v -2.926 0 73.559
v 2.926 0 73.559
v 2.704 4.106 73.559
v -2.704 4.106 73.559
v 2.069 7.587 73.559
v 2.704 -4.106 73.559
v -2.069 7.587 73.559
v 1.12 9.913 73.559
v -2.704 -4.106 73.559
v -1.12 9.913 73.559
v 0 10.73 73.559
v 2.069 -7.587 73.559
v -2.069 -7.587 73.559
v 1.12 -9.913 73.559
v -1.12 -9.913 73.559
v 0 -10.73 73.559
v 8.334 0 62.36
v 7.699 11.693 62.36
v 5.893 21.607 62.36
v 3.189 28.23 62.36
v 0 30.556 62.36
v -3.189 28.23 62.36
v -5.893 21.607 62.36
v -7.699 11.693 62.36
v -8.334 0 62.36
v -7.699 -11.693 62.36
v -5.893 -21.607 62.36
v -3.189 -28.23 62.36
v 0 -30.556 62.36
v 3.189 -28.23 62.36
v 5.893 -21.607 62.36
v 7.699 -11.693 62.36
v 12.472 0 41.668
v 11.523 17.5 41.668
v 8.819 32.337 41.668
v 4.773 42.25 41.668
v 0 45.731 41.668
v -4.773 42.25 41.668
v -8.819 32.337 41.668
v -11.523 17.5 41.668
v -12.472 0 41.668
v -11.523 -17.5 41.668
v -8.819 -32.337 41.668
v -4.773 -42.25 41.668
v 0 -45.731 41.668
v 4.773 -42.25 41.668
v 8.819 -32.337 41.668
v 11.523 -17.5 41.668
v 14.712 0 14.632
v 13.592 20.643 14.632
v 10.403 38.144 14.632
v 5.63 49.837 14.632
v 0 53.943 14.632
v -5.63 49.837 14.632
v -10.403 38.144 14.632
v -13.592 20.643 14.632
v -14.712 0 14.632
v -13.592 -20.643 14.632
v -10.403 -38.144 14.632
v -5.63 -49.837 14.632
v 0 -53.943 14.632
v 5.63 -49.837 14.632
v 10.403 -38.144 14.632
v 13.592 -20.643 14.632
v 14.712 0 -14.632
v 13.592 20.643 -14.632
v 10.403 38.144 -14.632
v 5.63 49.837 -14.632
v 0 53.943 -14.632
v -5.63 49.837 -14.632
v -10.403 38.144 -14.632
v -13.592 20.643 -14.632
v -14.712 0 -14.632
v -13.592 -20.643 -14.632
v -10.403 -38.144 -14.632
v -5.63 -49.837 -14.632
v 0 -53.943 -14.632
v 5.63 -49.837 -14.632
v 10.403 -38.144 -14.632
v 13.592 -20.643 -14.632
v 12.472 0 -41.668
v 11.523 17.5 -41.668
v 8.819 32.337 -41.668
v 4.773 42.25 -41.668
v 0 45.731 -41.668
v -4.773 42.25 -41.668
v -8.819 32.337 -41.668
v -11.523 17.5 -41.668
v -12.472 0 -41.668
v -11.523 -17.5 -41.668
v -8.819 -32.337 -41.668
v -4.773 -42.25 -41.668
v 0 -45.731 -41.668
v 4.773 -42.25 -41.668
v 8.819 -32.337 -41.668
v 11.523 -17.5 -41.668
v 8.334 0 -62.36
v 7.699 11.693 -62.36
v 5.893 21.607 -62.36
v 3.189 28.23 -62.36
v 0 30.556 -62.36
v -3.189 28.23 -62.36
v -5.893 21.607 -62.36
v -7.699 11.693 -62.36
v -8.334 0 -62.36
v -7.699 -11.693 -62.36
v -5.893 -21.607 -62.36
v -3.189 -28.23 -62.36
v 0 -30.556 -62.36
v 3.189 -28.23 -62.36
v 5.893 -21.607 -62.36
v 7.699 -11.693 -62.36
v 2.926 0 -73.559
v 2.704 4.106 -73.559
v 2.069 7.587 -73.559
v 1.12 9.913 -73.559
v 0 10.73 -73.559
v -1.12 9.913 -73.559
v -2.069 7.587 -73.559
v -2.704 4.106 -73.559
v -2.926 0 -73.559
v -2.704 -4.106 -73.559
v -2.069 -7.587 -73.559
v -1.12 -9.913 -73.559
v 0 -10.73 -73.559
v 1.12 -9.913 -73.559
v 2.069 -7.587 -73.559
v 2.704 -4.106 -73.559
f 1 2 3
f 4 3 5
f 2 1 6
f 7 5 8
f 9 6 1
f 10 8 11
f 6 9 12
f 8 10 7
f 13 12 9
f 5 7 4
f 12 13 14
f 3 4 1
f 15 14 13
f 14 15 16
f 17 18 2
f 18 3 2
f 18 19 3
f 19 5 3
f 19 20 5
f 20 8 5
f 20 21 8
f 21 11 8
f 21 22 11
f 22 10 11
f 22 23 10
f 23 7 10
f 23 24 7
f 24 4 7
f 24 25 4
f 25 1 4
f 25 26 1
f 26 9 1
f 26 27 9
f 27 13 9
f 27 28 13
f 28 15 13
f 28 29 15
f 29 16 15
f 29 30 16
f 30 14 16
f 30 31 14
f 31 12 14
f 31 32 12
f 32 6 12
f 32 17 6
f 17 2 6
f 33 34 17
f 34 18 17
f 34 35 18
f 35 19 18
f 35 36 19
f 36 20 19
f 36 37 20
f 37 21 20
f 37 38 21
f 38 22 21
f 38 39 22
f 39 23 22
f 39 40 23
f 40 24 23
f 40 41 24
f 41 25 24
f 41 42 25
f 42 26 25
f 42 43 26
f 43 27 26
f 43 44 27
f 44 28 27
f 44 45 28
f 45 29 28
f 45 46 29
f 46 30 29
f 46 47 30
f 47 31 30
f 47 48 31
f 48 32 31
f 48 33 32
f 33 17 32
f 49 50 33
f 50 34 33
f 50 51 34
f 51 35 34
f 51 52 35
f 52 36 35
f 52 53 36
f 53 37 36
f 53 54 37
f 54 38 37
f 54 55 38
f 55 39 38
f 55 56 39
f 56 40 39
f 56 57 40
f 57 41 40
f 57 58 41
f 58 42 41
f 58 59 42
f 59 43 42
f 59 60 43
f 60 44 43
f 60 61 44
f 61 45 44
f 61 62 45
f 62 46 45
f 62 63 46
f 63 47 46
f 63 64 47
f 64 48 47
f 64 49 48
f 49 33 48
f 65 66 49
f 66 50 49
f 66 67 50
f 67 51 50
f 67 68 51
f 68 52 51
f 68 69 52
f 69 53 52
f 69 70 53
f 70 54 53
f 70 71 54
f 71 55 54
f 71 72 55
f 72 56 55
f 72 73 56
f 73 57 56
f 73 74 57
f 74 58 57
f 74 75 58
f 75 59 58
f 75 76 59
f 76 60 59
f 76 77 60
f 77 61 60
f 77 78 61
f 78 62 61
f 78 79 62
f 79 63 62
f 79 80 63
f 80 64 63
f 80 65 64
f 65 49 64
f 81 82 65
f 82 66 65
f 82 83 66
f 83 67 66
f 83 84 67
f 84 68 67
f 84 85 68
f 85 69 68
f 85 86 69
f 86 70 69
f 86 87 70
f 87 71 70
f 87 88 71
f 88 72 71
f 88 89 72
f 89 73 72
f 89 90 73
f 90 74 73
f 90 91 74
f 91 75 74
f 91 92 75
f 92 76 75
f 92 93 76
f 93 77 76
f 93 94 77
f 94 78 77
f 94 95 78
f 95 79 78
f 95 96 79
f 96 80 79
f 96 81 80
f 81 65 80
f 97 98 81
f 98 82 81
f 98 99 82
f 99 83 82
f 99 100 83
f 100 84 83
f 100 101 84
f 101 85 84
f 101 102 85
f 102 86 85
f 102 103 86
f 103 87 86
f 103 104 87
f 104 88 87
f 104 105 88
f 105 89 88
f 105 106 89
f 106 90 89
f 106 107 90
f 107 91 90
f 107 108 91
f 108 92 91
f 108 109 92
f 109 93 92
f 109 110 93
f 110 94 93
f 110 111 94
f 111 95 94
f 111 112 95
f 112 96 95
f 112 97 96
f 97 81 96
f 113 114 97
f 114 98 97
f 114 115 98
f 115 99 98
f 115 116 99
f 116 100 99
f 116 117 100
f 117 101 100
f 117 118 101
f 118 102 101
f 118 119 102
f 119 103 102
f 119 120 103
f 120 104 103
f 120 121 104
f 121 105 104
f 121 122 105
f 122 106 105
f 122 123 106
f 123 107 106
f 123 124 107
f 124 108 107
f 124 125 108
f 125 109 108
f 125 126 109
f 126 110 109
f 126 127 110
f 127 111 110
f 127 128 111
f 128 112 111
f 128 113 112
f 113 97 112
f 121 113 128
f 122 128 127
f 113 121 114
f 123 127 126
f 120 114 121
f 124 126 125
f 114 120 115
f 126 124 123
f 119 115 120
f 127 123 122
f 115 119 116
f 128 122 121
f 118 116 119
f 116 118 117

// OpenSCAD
// Generated by SolidPython 1.0.1 on 2020-07-29 00:46:45


scale(v = [3, 11, 15]) {
	sphere(r = 5);
}
/***********************************************
*********      SolidPython code:      **********
************************************************
 
# import packages: SolidPython
from solid import *
from solid.utils import *
from itertools import chain, combinations, permutations


class Resize:

    def __init__(self, scad_file):
        self.scad_file = scad_file
        #self.scad_file = import_scad(scad_file)
        # cone/cylinder param:
        self.r1 = 0
        self.r2 = 0
        self.h = 0
        # rectangular prism param:
        self.w = 0
        self.l = 0
        # ellipse param:
        self.r = 0

    # import OpenScad code (file name corresponds to shape)


    # classify shape + parameters
    def assign(self, param1, param2, param3):
        if self.scad_file == 'cone.scad':
            self.r1 = param1
            self.r2 = param2
            self.h = param3
        elif self.scad_file == 'cylinder.scad':
            self.r1 = param1
            self.r2 = param2
            self.h = param3
        elif self.scad_file == 'rectangularPrism.scad':
            self.h = param1
            self.l = param2
            self.w = param3
        else:
            self.r = param1
            self.h = param2

    # resize parameters
    def iterate(self):
        x = range(3, 20, 2)
        i = 1
        if self.scad_file == 'cone.scad':
            tempList = list(permutations(x, 2))
            for temp in tempList:
                param1 = temp[0]
                param2 = temp[1]
                filepath = 'produced_scad_files/' + 'cone' + str(param1) + '_' + str(param2) + '_' + '.scad'
                scad_render_to_file(cylinder(h=param1, r1=param2, r2=0), filepath)

        elif self.scad_file == 'cylinder.scad':
            tempList = list(permutations(x, 3))
            for temp in tempList:
                param1 = temp[0]
                param2 = temp[1]
                filepath = 'produced_scad_files/' + 'cylinder' + str(param1) + '_' + str(param2) + '_' + '.scad'
                scad_render_to_file(cylinder(h=param1, r1=param2, r2=param2), filepath)

        elif self.scad_file == 'rectangularPrism.scad':
            tempList = list(permutations(x, 3))
            for temp in tempList:
                param1 = temp[0]
                param2 = temp[1]
                param3 = temp[2]
                filepath = 'produced_scad_files/' + 'rectangularPrism' + str(param1) + '_' + str(param2) + '_' + str(
                    param3) + '.scad'
                scad_render_to_file(cube(size=(param1, param2, param3)), filepath)

        elif self.scad_file == 'ellipse.scad':
            tempList = list(permutations(x, 4))
            for temp in tempList:
                param1 = temp[0]
                param2 = temp[1]
                param3 = temp[2]
                param4 = temp[3]
                filepath = 'produced_scad_files/' + 'ellipse' + str(param1) + '_' + str(param2) + '_' + str(param3) + '_' + str(param4) + '.scad'
                scad_render_to_file(scale([param1, param2, param3])(sphere(r=param4)), filepath)

    def render_to_scadfile(self):
        scad_render_to_file(scad, 'example.scad') 
 
************************************************/
